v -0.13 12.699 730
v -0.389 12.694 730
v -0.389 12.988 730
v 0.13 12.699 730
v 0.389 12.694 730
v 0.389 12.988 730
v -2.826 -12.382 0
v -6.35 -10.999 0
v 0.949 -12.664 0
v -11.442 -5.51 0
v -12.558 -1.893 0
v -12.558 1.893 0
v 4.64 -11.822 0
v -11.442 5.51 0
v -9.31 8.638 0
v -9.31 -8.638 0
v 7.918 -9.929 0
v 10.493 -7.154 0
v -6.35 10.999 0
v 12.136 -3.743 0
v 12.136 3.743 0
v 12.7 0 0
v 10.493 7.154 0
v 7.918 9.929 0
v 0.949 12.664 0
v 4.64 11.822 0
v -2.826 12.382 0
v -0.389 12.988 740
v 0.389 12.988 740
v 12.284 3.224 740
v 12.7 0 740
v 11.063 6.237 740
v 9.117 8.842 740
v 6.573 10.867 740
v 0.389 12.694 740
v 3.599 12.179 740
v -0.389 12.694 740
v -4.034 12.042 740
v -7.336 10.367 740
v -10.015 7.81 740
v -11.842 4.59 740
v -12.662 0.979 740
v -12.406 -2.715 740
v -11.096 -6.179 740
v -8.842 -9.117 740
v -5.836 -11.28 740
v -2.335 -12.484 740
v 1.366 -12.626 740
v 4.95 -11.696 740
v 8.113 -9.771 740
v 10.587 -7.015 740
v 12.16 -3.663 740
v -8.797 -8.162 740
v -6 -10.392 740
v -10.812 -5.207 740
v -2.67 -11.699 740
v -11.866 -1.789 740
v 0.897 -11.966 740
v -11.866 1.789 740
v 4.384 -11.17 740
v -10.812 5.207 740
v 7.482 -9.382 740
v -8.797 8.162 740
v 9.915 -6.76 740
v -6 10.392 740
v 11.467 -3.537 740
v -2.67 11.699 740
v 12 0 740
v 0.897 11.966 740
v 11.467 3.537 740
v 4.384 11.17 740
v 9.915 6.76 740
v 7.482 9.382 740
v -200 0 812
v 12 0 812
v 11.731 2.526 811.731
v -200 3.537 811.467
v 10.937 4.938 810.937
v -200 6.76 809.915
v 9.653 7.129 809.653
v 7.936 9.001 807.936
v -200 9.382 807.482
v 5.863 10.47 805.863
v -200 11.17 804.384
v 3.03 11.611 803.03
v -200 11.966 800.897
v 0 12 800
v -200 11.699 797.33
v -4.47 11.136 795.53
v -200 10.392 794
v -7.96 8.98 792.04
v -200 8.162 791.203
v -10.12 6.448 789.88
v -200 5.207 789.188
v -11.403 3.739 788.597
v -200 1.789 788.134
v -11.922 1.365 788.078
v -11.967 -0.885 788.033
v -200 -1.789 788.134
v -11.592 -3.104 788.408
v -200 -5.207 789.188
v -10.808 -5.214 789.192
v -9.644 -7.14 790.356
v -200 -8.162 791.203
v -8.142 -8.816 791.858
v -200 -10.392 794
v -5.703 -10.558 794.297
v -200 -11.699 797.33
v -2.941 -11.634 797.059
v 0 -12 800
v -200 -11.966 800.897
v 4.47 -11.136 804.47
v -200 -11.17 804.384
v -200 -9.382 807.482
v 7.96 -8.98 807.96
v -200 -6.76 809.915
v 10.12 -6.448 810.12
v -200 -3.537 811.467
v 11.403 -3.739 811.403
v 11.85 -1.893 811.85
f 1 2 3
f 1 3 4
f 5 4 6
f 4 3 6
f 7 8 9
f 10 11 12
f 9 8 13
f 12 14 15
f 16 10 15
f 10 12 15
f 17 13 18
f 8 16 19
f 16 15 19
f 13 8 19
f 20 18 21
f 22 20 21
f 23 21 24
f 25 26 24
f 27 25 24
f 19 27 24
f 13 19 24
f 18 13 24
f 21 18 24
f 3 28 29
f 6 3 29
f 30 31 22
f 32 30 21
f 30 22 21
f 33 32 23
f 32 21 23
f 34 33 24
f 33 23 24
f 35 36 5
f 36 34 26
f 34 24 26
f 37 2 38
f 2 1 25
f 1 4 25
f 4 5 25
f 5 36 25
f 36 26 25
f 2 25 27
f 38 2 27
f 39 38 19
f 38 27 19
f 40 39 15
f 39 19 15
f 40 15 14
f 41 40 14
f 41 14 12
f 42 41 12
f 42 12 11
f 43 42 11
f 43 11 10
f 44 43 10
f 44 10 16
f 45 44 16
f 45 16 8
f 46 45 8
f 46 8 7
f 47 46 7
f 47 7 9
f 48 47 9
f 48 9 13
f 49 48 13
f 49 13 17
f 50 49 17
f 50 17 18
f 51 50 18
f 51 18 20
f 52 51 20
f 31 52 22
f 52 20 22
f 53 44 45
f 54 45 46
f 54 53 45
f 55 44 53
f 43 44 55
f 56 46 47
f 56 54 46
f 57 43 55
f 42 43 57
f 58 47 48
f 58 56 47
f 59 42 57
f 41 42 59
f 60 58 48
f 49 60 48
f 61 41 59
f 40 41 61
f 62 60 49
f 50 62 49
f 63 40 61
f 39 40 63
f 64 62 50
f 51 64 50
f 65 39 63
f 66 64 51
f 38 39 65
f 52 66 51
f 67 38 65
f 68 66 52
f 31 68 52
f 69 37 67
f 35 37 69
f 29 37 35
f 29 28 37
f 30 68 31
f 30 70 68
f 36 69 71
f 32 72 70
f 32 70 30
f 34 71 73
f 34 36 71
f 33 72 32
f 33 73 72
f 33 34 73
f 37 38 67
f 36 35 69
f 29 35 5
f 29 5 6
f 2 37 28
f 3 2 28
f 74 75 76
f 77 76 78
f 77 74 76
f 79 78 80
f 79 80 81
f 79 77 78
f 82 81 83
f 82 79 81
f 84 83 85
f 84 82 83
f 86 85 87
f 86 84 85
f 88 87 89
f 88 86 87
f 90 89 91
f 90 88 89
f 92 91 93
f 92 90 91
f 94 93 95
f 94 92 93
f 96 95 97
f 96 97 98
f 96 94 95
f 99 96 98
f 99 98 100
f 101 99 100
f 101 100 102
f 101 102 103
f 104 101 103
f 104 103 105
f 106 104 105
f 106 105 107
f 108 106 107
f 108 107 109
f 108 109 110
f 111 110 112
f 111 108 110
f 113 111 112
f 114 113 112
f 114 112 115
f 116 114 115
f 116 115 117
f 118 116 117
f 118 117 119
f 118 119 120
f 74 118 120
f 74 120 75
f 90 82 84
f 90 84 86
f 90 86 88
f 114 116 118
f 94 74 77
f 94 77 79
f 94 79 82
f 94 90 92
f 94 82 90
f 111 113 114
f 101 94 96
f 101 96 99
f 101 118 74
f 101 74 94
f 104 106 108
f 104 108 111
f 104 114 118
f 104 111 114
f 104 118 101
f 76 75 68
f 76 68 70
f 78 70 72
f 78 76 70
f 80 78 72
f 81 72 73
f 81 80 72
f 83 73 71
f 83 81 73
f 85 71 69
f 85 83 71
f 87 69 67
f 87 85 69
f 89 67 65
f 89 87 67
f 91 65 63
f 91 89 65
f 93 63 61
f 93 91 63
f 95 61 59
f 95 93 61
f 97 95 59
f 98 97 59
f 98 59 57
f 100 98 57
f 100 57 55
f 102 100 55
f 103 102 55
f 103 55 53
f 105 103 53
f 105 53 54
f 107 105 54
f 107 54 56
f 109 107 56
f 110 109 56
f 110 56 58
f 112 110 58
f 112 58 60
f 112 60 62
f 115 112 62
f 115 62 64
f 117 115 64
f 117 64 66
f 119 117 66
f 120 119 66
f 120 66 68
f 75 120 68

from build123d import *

# Parameters (mm, degrees)
CROQUIS1_R              = 12.7
SALIENTE_EXTRUIR1_DEPTH = 740
CROQUIS2_W              = 0.777166432
CROQUIS2_H              = 0.57610026
SALIENTE_EXTRUIR2_DEPTH = 10
CROQUIS3_R              = 12


with BuildPart() as part:
    # Croquis1 → Saliente-Extruir1 (new body)
    with BuildSketch(Plane.XY):
        Circle(CROQUIS1_R)
    extrude(amount=SALIENTE_EXTRUIR1_DEPTH)

    # Croquis2 → Saliente-Extruir2 (add)
    with BuildSketch(Plane.XY.offset(740)):
        with Locations((0, 12.7)):
            Rectangle(CROQUIS2_W, CROQUIS2_H)
    extrude(amount=-SALIENTE_EXTRUIR2_DEPTH)

    # Barrer1: sweep along a curve in space
    with BuildLine() as barrer1_path:
        Line((0, 0, 740), (0, 0, 800))
        Line((0, 0, 800), (-200, 0, 800))
    # Croquis3 → Barrer1 (sweep)
    with BuildSketch(Plane.XY.offset(740)):
        Circle(CROQUIS3_R)
    sweep(path=barrer1_path.line, transition=Transition.RIGHT)


solid = part.part
